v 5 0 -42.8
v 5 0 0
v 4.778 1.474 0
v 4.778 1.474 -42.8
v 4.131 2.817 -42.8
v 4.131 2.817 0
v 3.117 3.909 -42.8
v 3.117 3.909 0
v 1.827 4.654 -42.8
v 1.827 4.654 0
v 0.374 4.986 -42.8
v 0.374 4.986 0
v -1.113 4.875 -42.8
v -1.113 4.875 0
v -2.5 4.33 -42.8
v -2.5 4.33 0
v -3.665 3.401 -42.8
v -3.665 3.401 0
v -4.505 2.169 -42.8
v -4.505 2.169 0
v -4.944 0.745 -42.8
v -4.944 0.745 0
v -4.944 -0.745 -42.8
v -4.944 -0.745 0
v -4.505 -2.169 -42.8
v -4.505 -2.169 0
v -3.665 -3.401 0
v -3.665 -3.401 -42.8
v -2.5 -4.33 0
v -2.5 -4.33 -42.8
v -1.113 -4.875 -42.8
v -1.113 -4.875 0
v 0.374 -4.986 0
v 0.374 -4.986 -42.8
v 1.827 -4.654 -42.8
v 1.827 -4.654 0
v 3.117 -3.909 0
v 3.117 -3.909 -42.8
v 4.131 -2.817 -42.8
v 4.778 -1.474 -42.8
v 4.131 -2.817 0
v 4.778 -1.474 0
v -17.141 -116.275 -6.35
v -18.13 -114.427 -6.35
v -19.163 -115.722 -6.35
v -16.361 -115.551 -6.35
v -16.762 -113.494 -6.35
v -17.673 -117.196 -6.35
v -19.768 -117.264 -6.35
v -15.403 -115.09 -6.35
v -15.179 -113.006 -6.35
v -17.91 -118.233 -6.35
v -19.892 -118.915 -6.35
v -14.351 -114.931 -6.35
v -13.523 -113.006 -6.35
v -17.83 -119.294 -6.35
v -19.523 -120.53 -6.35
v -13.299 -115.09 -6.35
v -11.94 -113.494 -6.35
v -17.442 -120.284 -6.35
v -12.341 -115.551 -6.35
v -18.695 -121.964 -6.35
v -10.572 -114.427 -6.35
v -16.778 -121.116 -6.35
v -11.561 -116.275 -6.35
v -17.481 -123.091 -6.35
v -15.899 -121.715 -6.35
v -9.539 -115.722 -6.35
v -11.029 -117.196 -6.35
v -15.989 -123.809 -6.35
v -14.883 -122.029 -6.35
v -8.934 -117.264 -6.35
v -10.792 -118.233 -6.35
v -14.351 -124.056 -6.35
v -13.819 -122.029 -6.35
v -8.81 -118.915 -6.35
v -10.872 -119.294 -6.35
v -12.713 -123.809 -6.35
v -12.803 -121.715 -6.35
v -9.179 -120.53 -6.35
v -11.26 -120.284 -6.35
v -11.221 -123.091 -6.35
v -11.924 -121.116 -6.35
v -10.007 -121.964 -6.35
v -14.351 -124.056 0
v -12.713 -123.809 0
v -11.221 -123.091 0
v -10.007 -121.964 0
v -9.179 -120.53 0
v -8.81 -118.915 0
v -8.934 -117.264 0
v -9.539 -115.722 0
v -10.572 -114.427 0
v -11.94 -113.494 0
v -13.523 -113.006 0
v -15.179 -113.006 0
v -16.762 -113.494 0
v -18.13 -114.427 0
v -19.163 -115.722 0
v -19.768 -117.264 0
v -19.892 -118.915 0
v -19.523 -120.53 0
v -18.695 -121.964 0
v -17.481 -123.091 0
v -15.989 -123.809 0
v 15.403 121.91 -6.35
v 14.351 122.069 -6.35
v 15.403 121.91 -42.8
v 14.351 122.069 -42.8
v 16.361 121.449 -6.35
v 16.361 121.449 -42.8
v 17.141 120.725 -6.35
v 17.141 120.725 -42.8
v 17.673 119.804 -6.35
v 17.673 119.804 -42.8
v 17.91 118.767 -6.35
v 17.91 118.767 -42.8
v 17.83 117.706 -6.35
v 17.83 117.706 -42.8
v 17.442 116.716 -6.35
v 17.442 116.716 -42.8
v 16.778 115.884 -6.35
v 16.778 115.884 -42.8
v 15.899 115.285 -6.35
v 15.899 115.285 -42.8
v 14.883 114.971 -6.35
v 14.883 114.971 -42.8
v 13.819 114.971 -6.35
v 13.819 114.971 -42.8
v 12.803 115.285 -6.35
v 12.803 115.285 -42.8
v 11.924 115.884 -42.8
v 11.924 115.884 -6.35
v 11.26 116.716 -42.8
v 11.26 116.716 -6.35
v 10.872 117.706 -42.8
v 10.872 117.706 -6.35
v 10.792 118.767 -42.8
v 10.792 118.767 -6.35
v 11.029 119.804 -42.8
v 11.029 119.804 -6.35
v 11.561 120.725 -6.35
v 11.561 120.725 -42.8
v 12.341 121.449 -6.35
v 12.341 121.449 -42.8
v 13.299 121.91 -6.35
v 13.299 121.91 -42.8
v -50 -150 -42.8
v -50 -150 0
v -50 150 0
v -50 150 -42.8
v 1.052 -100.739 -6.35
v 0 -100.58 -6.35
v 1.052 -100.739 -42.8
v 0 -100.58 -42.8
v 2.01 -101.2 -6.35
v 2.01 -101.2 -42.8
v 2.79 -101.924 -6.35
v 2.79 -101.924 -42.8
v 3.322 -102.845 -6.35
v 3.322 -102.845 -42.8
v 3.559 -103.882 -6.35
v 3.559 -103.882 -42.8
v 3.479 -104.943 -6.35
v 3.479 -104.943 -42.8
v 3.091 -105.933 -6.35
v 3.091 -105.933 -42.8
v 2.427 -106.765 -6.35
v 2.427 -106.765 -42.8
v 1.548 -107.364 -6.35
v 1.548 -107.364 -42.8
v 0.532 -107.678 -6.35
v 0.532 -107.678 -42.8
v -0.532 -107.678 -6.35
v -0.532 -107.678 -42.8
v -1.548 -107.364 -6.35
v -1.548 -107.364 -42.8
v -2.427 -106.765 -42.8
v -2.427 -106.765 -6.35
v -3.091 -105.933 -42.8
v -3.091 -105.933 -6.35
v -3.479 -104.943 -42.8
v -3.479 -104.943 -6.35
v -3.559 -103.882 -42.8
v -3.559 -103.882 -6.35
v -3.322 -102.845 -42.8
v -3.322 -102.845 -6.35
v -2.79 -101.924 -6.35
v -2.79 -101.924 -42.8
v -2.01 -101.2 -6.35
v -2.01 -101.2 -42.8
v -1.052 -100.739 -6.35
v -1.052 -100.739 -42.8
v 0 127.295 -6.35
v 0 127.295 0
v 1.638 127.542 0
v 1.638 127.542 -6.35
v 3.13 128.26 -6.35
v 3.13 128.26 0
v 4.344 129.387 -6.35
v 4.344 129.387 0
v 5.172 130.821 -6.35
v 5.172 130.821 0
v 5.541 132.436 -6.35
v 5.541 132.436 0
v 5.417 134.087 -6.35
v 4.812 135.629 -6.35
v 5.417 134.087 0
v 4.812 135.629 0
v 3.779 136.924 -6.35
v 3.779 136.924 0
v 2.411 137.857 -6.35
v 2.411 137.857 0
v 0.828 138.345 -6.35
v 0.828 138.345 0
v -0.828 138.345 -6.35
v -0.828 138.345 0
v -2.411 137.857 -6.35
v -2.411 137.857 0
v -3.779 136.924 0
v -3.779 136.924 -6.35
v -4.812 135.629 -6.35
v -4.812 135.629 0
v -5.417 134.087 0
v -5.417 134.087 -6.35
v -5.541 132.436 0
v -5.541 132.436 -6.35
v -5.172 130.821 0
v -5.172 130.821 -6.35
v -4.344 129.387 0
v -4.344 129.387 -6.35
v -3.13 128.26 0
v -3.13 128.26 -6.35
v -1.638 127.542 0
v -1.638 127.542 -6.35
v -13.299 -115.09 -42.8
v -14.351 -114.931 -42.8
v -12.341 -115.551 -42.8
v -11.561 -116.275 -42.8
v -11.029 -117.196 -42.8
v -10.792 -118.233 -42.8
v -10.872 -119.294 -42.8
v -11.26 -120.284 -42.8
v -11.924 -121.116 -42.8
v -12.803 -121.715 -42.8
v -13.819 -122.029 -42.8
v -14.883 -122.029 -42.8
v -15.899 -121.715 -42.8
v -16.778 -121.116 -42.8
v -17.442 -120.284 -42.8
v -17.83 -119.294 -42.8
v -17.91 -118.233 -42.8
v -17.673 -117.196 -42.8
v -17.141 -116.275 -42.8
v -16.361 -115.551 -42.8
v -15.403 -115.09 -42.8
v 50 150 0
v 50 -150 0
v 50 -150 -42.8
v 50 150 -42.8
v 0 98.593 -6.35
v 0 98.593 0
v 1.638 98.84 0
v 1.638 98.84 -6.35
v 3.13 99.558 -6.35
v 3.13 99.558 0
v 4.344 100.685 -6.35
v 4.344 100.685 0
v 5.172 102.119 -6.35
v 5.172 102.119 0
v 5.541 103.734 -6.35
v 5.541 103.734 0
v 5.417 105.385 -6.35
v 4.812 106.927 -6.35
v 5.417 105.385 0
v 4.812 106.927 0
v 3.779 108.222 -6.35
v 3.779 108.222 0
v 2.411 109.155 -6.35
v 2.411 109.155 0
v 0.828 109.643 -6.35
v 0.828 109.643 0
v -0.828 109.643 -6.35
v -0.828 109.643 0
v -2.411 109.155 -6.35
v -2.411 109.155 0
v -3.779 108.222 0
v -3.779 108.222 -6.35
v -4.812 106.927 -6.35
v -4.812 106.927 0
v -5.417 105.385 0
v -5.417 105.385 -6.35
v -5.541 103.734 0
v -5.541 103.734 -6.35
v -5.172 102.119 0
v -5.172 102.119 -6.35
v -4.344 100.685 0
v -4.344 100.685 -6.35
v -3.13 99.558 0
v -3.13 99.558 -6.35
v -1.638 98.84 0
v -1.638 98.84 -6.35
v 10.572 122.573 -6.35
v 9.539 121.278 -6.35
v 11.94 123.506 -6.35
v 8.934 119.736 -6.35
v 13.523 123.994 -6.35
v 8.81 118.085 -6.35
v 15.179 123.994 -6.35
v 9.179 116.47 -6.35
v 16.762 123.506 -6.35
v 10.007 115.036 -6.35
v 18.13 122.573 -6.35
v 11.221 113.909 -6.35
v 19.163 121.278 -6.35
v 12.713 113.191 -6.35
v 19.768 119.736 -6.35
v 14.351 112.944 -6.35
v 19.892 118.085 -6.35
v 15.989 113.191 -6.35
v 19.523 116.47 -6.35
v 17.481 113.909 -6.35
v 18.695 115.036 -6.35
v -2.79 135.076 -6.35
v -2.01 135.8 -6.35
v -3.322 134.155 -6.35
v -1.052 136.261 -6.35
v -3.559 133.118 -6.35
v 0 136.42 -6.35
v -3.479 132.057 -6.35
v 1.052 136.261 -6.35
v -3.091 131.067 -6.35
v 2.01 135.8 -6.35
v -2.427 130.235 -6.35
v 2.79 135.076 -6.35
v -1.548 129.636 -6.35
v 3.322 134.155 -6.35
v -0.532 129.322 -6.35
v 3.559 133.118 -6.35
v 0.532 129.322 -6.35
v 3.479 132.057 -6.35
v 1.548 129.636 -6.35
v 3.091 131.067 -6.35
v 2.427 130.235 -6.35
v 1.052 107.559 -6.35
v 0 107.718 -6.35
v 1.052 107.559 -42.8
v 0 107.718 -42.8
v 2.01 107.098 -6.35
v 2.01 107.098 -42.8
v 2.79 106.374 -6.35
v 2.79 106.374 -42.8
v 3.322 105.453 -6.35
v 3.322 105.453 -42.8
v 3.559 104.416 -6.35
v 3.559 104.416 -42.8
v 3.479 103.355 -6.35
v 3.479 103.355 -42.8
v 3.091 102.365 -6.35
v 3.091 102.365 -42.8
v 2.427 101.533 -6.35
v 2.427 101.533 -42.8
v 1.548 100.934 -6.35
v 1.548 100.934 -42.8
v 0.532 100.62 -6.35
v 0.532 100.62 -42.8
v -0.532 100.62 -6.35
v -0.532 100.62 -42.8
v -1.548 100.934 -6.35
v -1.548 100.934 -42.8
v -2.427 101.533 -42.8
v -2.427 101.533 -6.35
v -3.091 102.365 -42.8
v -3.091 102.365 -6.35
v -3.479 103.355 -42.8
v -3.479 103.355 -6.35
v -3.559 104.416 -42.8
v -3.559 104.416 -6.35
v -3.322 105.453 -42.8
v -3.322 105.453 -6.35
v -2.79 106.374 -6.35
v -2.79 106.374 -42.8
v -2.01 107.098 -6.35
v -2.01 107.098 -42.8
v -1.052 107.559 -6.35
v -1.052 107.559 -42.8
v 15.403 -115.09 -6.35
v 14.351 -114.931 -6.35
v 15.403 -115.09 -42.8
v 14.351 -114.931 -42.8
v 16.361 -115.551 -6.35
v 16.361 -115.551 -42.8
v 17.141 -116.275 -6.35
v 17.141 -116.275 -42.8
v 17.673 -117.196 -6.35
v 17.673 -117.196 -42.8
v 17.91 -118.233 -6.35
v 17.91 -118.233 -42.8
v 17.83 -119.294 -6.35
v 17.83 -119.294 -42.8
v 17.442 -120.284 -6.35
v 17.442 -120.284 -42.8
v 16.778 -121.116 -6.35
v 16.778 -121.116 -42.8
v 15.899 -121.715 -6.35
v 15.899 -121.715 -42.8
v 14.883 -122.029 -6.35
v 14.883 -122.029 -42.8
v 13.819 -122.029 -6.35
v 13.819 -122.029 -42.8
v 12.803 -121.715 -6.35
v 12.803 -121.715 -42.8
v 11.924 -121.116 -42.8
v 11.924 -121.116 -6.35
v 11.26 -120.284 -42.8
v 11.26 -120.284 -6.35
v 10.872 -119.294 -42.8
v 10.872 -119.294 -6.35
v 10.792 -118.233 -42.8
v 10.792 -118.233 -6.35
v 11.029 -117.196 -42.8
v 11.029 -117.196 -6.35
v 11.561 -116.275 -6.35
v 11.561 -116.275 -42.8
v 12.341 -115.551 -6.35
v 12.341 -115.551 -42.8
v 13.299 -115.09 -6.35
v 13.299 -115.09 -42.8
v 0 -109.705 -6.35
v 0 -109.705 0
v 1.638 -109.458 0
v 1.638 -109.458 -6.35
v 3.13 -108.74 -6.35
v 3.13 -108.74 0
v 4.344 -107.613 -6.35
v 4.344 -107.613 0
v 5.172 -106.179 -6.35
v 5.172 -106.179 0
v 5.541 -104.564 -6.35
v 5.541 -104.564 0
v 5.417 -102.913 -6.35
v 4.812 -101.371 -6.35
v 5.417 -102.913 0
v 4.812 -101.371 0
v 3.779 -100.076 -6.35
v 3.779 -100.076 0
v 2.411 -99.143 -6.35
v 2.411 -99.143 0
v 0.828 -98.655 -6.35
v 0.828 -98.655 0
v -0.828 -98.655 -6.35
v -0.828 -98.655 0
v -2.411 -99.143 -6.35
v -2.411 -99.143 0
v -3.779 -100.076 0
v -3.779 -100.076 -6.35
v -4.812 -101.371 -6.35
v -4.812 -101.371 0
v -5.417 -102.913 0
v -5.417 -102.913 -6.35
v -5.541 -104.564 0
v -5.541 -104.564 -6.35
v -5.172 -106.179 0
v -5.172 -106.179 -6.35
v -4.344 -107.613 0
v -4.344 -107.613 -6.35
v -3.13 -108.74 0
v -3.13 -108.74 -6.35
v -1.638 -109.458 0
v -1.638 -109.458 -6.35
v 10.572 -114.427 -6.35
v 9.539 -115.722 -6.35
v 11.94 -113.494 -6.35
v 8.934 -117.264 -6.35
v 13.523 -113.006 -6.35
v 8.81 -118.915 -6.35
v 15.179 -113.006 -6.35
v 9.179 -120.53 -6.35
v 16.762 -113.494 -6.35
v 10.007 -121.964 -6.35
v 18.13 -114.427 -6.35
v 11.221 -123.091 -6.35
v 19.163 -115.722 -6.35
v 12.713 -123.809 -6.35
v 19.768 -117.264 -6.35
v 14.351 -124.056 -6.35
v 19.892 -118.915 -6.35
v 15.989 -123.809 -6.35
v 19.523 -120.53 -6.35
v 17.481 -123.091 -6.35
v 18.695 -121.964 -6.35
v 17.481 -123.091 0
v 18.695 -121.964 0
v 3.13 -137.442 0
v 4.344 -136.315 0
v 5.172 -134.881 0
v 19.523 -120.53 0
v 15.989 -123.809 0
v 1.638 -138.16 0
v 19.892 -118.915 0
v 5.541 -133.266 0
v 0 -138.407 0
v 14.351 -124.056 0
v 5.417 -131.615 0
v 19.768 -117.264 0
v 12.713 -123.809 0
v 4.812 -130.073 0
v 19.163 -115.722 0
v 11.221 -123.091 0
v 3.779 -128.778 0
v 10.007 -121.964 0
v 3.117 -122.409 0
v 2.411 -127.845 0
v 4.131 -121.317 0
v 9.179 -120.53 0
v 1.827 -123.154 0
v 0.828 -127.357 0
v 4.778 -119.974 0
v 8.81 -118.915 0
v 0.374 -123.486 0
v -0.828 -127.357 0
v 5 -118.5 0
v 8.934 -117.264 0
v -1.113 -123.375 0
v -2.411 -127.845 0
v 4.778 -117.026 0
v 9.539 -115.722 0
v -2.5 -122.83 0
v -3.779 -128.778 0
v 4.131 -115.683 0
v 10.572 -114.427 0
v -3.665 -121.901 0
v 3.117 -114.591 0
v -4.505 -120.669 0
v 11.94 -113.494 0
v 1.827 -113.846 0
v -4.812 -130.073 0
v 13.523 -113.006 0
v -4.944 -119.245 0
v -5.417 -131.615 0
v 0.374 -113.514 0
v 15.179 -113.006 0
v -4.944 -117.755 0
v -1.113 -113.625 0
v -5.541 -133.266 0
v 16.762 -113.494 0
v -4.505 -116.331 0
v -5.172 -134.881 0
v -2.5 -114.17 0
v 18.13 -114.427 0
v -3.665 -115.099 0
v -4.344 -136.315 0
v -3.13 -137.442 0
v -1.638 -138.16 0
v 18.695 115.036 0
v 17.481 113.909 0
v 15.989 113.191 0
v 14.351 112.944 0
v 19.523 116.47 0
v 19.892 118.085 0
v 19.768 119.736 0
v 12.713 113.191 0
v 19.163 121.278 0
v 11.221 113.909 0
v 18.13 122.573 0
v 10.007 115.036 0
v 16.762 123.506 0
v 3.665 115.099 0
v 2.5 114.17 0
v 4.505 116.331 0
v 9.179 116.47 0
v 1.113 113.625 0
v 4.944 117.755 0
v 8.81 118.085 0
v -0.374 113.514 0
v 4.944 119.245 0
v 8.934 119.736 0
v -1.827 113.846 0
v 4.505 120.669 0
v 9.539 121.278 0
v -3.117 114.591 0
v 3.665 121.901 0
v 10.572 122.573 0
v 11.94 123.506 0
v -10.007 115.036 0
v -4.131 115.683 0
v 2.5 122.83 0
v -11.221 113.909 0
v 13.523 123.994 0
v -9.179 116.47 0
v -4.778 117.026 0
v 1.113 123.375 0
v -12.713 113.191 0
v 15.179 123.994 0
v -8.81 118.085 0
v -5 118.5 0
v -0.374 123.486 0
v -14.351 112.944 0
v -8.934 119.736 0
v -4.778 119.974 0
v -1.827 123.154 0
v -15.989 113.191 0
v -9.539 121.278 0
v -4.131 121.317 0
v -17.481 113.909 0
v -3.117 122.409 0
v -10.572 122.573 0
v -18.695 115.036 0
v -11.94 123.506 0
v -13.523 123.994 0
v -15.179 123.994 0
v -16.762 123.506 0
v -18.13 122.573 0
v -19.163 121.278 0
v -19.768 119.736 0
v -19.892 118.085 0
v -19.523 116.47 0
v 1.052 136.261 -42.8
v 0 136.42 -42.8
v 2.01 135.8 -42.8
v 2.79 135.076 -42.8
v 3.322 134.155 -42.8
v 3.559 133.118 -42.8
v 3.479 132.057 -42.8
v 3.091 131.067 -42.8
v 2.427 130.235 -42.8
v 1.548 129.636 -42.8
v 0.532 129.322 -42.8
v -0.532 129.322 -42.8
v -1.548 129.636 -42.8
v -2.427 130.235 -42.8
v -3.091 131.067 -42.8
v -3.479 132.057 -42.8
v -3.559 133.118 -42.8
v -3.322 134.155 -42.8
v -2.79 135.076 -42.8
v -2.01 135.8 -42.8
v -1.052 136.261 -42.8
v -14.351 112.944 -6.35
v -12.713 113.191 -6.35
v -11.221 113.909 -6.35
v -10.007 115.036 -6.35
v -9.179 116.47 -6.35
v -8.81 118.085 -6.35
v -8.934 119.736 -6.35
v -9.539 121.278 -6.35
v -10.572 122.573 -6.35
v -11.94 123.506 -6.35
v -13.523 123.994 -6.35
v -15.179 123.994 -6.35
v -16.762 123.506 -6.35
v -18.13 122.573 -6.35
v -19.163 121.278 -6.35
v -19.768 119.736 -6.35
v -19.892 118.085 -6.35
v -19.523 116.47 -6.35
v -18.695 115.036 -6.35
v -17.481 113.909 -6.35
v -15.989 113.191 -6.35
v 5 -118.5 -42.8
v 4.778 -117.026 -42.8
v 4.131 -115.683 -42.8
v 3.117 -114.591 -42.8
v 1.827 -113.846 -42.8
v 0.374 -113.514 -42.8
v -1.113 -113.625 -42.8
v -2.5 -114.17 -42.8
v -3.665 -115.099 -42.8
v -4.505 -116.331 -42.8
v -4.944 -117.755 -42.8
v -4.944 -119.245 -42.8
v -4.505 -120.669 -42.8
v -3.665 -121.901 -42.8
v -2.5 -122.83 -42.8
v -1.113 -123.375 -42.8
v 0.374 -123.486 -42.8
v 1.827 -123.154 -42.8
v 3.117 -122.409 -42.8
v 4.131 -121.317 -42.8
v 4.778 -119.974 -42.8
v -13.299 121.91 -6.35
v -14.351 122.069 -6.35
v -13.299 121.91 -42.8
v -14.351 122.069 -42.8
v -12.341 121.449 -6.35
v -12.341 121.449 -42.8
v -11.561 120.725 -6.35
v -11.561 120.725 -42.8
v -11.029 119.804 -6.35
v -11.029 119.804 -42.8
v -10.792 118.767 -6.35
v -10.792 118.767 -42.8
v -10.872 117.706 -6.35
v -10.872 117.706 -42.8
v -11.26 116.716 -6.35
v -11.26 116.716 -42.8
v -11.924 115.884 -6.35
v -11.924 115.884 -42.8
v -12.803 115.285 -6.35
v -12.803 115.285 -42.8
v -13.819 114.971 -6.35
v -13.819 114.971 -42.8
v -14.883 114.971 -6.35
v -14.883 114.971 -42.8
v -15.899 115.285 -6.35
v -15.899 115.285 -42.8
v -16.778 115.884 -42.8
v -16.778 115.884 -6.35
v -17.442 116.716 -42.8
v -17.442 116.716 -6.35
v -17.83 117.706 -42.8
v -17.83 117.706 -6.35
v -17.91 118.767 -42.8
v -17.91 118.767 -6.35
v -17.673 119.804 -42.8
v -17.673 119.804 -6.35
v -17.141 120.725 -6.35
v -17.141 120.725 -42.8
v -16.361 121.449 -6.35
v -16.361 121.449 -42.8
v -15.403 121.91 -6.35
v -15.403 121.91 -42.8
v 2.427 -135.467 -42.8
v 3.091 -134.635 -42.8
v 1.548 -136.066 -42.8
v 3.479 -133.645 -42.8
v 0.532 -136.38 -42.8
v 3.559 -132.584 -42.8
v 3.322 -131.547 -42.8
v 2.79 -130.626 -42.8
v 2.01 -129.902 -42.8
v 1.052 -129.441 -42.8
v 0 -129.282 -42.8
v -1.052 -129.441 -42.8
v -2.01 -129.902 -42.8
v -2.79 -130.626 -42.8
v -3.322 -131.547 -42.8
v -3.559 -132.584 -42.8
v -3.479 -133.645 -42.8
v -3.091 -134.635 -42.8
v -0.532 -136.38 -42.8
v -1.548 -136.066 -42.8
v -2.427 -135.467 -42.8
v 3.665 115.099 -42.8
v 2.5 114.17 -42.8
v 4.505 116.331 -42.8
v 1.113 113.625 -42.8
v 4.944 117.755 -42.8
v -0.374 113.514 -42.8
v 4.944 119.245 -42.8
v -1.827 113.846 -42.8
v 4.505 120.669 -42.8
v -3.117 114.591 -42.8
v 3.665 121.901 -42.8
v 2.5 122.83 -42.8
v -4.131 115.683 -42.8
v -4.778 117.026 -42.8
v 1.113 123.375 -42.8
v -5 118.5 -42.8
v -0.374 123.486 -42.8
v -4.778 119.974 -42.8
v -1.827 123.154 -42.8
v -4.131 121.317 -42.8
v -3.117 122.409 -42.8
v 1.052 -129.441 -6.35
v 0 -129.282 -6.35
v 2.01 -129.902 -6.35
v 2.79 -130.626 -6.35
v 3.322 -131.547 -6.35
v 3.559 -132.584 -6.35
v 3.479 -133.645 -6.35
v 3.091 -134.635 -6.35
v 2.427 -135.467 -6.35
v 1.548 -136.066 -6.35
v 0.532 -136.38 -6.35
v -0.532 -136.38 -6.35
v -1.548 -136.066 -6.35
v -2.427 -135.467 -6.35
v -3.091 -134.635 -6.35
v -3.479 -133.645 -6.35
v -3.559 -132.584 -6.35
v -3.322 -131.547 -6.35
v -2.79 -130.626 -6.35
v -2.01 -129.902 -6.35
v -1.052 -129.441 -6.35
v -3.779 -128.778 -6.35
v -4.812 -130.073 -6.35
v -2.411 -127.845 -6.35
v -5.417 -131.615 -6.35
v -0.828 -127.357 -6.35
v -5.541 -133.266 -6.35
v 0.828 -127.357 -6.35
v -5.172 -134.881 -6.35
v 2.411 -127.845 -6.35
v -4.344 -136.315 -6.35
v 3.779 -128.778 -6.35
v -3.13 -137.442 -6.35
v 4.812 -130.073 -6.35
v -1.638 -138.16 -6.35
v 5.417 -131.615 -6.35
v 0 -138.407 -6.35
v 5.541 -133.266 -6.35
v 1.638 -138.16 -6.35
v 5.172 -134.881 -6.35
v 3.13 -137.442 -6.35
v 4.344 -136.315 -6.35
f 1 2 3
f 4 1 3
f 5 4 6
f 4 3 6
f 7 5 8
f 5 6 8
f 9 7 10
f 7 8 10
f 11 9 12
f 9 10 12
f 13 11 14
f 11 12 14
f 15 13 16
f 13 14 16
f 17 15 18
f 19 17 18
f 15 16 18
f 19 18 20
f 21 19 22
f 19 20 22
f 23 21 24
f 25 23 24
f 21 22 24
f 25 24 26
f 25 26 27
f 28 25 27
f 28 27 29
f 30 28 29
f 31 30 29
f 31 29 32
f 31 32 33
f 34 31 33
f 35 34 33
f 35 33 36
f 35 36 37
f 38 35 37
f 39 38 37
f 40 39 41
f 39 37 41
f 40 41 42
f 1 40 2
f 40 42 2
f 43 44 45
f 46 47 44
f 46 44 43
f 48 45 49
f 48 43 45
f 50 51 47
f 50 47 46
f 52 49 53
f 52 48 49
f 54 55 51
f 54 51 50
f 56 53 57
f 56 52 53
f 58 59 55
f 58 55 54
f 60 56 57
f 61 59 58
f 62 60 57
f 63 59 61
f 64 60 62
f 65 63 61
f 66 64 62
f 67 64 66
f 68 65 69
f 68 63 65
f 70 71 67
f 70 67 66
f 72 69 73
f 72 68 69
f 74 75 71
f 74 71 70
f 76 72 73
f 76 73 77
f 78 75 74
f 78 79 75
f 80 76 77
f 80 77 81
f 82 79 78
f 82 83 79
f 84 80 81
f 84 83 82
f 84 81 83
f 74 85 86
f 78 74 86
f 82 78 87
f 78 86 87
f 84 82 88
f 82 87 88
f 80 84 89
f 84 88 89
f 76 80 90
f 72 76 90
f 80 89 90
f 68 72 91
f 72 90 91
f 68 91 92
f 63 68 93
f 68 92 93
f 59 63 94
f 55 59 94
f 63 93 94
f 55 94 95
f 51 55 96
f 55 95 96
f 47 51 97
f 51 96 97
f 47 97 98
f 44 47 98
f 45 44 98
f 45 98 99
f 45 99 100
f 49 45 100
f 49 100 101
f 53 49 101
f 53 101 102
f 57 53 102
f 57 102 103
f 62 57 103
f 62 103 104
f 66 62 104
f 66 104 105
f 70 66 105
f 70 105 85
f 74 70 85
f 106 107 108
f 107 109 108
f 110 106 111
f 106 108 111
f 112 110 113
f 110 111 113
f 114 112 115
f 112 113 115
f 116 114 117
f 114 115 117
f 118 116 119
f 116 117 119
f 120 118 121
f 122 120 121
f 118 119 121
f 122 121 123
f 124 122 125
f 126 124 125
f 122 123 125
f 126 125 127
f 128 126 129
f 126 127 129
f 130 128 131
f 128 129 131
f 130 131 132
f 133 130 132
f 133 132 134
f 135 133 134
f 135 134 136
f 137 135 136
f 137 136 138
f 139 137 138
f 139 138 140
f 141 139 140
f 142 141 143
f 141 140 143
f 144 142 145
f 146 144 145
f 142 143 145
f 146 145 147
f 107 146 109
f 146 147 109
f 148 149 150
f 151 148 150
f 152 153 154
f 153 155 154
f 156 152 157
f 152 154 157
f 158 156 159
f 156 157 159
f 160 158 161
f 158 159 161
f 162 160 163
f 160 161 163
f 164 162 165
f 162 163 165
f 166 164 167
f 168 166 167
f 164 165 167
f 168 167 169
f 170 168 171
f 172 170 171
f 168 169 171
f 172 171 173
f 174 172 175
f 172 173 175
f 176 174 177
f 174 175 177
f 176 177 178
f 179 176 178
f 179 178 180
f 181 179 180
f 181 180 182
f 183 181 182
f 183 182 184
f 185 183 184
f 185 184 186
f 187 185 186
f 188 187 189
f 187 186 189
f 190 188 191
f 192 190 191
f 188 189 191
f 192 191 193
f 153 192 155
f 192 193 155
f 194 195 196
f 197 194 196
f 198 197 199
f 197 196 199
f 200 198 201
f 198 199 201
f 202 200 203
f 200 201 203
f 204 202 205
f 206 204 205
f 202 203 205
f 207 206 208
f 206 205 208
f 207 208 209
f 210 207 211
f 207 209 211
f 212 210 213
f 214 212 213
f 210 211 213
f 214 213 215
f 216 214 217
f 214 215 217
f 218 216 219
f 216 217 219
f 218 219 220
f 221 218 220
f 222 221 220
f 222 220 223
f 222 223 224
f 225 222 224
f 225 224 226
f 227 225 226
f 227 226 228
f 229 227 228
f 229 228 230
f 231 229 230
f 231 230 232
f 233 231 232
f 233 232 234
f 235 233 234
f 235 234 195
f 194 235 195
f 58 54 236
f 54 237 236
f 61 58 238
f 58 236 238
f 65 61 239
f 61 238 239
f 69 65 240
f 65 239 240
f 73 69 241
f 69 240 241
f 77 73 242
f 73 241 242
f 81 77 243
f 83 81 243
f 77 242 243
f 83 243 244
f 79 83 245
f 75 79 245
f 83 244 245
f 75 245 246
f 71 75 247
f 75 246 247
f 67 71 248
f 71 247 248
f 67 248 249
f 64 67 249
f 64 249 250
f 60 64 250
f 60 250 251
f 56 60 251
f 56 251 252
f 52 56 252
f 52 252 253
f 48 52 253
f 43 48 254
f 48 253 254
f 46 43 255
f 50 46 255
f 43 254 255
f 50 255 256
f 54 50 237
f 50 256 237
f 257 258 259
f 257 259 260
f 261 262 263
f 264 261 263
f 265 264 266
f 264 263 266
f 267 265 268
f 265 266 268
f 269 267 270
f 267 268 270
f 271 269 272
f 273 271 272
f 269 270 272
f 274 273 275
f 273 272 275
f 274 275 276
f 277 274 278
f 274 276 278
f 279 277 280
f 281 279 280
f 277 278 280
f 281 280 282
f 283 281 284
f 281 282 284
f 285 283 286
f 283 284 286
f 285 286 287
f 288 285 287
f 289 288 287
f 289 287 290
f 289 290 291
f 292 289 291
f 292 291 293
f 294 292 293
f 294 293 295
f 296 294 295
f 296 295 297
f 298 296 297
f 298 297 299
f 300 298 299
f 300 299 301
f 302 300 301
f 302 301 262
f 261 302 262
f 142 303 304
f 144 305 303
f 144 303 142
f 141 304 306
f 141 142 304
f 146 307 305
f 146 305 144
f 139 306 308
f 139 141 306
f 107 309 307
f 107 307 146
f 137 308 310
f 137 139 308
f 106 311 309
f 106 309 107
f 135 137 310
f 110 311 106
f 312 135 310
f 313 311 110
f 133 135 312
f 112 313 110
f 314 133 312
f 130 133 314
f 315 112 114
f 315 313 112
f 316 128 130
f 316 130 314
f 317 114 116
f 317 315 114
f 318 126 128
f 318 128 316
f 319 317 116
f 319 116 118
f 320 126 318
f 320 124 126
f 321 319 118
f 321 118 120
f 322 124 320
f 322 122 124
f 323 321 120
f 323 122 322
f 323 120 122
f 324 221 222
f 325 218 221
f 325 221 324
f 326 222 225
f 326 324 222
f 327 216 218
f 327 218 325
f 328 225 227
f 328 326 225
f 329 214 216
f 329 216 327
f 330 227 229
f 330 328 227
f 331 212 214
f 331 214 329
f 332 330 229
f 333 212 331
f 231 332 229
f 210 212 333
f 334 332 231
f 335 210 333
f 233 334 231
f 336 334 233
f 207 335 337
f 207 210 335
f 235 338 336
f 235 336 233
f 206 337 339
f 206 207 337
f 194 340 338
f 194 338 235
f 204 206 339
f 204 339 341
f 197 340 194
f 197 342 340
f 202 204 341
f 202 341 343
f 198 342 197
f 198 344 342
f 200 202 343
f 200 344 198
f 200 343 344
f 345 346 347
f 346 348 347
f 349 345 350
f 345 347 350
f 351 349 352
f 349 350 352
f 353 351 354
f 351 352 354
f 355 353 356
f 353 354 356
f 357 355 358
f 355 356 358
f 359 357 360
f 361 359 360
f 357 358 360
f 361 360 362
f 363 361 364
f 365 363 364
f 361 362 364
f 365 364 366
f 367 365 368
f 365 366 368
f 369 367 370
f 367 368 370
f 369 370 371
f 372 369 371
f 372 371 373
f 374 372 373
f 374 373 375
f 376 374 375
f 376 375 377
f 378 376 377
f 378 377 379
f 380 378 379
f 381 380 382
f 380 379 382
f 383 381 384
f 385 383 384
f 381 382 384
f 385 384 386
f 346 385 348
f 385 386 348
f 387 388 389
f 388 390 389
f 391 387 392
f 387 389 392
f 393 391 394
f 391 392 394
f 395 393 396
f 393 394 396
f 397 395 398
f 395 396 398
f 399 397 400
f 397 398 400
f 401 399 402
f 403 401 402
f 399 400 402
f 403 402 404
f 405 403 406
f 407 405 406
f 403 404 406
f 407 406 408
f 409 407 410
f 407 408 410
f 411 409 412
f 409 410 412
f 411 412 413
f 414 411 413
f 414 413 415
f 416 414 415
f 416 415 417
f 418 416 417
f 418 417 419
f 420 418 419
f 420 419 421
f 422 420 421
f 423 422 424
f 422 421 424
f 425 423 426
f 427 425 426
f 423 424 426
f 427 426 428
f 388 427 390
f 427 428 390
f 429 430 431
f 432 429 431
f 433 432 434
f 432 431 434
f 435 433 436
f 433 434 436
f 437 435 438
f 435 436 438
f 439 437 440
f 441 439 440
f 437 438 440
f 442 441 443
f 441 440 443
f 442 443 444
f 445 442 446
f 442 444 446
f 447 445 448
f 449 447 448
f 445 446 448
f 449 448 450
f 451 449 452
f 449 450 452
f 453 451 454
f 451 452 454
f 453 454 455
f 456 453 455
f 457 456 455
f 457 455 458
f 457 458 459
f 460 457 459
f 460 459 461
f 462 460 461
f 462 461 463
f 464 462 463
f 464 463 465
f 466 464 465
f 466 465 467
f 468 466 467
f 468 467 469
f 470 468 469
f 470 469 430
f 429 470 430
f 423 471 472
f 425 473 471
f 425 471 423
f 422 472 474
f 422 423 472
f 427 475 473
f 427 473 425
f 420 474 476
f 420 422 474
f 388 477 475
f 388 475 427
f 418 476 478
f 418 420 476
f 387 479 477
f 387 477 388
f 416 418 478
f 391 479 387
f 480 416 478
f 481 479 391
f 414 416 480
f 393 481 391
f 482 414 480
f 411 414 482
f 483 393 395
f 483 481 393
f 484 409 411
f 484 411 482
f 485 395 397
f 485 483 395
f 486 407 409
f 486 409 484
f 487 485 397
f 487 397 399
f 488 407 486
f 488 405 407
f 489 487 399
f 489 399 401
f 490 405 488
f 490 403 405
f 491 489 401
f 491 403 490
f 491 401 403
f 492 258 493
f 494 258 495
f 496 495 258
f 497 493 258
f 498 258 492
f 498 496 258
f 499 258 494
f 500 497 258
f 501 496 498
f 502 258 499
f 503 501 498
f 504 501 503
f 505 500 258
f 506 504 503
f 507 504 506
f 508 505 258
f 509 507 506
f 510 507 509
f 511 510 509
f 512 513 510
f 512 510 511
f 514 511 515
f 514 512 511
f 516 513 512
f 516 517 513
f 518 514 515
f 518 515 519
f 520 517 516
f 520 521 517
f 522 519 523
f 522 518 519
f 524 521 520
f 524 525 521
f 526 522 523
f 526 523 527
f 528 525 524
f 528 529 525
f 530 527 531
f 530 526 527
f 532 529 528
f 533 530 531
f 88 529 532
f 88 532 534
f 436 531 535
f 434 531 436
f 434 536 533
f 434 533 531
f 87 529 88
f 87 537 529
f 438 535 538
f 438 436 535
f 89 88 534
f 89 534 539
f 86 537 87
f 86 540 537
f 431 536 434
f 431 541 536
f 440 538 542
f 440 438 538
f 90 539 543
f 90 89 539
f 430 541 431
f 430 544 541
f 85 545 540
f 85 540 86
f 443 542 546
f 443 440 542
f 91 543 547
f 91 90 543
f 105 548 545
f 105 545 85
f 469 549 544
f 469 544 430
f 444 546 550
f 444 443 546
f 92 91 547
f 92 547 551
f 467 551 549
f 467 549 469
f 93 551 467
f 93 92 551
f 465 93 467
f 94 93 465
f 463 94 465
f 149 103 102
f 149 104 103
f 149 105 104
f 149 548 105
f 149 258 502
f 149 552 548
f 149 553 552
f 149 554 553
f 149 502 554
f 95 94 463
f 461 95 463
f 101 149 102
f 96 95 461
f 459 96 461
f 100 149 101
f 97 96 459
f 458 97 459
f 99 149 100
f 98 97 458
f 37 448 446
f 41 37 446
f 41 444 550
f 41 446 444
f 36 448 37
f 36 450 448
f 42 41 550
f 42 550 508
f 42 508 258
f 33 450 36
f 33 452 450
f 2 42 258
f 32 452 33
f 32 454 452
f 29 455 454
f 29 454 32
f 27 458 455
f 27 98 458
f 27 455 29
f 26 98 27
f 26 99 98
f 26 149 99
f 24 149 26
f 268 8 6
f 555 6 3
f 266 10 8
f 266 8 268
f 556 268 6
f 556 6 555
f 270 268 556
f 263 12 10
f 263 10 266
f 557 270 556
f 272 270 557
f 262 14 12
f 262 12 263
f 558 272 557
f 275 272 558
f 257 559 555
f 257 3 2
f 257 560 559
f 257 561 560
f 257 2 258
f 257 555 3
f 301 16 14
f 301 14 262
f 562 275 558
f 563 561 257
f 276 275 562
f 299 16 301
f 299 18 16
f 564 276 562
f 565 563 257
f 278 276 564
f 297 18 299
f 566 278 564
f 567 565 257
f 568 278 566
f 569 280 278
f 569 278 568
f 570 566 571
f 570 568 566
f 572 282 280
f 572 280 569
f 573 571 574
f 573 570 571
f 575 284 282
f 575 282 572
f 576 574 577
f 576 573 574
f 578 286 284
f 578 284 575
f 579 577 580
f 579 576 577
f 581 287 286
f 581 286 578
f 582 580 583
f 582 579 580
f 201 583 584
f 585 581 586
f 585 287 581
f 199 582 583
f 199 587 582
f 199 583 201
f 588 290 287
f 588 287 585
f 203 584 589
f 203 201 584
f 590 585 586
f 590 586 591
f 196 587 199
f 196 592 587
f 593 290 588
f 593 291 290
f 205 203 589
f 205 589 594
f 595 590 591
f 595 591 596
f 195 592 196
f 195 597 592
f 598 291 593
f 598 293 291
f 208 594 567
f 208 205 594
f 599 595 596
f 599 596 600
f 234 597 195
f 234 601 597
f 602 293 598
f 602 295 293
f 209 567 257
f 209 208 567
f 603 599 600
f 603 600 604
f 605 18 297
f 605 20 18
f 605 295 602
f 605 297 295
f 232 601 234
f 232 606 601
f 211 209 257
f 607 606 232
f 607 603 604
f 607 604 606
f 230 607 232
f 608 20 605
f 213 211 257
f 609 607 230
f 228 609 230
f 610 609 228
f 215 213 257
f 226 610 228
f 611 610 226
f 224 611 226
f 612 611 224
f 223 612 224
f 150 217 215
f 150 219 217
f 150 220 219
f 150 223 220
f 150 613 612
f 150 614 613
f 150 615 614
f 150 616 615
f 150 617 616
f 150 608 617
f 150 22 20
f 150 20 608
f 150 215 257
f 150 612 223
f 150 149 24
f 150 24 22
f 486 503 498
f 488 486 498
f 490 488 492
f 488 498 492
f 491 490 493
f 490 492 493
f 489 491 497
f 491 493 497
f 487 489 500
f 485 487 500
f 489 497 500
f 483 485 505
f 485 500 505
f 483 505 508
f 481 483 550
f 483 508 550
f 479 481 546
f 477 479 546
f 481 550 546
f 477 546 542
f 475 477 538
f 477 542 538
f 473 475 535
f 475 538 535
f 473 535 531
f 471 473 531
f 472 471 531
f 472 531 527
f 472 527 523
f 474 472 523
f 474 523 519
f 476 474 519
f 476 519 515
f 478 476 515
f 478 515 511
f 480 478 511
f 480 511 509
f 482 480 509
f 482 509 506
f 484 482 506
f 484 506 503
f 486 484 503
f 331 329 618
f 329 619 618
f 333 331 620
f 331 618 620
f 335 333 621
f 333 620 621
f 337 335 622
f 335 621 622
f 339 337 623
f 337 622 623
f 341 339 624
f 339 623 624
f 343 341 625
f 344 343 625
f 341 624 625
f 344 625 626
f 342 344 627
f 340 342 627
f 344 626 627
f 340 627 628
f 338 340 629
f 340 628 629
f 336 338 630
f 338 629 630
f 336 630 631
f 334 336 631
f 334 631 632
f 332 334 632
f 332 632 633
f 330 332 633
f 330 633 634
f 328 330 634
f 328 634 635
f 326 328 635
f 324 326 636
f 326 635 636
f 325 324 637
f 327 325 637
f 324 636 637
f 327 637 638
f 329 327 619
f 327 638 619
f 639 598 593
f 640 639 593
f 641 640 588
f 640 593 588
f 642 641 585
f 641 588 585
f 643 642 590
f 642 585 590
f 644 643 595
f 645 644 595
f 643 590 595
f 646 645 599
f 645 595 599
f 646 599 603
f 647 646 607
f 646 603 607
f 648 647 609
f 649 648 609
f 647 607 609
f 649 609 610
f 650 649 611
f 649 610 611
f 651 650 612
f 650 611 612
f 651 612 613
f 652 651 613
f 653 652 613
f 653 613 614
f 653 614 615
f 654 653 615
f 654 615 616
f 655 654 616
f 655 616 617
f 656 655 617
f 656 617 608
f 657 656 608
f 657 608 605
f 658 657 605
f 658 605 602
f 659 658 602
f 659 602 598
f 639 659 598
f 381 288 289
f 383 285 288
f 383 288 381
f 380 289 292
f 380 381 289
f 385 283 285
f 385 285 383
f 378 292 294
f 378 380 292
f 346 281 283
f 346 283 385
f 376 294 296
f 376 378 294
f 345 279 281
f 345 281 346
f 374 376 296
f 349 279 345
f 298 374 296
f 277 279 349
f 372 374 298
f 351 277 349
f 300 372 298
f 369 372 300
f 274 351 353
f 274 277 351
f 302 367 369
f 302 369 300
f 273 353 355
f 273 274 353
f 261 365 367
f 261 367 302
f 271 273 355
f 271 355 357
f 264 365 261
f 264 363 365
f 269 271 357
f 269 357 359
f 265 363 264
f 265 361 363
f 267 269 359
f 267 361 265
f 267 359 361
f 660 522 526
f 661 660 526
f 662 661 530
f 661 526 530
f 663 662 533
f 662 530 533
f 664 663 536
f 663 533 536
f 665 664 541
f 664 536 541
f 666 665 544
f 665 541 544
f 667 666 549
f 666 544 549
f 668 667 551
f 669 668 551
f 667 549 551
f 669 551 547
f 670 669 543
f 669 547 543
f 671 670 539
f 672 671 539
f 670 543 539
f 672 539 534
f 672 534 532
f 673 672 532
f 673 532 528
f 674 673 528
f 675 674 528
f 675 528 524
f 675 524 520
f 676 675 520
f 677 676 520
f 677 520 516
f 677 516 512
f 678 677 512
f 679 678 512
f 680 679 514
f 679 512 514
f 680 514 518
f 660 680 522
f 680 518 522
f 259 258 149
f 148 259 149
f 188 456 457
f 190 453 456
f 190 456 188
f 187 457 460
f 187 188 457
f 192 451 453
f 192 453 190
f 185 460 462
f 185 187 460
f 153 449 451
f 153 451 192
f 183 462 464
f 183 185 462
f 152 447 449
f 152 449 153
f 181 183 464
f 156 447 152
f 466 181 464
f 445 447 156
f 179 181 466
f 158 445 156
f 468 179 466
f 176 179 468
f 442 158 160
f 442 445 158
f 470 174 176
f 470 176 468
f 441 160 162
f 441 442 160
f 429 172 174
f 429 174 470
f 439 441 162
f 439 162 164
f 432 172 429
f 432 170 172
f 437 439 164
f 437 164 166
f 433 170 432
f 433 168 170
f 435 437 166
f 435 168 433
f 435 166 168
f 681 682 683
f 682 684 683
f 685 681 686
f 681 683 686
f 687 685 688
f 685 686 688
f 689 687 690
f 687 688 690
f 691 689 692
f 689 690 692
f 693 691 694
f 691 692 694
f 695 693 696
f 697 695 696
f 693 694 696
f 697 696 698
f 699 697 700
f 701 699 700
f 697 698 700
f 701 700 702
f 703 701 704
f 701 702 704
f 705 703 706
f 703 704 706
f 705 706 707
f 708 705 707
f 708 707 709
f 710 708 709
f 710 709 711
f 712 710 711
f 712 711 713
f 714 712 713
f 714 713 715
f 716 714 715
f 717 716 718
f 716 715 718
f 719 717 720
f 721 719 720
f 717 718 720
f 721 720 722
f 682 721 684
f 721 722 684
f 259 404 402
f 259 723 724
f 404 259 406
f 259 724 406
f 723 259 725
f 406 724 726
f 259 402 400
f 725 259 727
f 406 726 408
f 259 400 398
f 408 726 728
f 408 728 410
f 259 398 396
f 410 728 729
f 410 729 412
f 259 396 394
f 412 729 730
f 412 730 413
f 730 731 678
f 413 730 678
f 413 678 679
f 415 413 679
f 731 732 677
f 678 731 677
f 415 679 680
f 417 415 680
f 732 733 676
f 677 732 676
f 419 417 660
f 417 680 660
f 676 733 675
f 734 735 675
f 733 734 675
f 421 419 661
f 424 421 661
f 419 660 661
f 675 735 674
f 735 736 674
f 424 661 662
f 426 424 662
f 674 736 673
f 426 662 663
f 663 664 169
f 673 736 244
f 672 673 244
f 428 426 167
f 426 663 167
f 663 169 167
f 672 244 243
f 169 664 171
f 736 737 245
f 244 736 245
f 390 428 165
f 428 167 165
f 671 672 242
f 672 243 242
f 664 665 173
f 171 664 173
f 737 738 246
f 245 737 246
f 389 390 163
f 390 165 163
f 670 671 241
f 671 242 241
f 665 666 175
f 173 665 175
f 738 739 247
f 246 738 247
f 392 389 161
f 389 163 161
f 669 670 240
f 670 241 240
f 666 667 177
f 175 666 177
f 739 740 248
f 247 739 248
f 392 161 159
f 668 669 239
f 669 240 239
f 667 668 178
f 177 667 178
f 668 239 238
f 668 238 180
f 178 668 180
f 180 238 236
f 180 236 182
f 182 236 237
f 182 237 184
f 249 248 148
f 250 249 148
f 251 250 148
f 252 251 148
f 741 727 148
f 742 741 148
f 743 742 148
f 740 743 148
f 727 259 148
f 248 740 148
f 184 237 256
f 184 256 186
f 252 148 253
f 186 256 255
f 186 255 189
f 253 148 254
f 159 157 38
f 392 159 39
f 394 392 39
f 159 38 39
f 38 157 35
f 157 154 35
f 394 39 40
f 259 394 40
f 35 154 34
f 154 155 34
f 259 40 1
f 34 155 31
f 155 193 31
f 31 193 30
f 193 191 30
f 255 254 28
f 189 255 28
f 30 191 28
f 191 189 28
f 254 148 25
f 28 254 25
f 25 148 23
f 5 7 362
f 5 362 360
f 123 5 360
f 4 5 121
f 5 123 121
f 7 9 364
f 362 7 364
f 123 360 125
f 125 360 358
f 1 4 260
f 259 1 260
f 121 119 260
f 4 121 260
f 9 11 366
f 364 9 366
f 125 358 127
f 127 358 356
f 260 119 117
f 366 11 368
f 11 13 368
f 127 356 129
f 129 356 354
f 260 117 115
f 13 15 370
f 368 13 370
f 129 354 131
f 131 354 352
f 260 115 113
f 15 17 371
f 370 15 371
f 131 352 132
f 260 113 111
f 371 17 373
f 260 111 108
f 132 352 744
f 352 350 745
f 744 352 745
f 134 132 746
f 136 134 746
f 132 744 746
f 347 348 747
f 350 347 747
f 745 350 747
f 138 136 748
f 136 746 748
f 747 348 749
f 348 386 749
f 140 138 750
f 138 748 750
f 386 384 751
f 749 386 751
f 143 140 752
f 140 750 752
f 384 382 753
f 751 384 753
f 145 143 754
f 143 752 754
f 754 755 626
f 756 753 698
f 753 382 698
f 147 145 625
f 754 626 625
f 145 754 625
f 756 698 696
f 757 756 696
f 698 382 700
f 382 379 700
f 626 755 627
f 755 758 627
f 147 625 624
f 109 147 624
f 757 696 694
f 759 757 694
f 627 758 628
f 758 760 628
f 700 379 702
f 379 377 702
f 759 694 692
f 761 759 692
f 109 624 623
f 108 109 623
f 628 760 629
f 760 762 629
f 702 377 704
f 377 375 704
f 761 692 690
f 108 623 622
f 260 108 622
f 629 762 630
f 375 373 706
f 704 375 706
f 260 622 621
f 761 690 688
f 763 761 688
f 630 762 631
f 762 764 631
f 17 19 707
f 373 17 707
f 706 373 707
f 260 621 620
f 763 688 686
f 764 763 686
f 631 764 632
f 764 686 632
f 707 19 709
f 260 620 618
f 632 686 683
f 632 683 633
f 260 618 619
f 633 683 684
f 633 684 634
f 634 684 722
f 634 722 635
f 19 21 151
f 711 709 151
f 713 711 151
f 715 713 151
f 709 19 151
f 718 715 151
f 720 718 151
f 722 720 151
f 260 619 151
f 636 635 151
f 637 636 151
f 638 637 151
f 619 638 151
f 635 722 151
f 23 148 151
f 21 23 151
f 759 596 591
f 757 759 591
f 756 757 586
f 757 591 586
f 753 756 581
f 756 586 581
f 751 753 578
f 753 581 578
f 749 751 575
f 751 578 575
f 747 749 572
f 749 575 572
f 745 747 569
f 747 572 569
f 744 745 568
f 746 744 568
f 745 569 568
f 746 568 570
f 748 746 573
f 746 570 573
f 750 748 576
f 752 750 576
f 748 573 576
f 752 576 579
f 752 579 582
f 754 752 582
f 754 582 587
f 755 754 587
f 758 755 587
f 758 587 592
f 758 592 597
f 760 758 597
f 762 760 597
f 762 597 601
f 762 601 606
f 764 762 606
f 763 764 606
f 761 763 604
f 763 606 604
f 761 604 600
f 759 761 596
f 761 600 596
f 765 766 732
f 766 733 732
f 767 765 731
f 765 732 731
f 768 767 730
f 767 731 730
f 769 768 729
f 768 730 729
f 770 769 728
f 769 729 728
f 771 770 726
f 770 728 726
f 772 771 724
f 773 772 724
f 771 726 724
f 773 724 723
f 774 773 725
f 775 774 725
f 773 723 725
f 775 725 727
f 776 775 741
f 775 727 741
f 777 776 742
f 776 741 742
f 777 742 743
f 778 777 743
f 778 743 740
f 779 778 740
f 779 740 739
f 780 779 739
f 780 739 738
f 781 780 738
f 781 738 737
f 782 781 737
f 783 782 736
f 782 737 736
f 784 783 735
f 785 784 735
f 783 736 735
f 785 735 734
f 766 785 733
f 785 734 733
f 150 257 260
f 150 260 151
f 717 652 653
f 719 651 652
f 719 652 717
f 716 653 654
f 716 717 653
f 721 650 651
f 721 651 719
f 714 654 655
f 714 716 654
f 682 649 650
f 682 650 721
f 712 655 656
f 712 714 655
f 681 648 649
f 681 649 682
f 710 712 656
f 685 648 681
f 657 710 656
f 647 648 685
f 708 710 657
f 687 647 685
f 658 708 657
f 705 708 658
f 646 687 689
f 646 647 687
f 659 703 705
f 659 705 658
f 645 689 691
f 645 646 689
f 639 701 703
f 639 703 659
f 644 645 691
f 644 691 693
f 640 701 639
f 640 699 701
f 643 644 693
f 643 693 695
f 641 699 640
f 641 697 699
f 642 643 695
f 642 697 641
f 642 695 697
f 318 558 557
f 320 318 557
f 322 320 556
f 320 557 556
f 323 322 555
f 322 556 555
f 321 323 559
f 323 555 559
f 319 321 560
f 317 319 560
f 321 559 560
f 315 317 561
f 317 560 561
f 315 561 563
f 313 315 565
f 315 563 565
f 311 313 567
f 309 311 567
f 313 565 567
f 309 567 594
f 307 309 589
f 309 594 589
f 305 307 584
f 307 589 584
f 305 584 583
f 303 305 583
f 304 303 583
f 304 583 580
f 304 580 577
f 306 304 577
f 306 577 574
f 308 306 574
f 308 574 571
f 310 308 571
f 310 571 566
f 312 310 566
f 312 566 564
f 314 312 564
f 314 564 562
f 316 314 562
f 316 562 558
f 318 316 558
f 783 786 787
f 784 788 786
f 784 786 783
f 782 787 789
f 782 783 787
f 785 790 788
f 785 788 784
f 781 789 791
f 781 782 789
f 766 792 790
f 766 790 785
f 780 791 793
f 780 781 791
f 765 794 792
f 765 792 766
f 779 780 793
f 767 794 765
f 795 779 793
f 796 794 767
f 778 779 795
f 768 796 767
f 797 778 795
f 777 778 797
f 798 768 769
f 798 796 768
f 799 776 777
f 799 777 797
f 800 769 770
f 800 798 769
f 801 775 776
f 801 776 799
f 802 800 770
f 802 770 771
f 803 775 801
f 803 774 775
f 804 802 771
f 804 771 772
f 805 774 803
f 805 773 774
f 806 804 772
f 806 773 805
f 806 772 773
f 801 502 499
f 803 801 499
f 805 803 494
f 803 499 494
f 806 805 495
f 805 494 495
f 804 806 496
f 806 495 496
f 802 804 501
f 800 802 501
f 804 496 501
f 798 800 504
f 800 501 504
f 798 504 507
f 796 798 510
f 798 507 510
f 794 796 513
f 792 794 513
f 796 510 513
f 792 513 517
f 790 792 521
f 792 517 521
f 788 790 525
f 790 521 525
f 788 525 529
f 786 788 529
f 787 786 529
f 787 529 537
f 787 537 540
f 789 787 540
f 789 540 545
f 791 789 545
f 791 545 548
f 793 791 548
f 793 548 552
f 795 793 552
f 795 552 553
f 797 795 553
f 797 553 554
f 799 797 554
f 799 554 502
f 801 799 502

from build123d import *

# Parameters (mm, degrees)
SKETCH1_W                                        = 300
SKETCH1_H                                        = 100
SKETCH1_R                                        = 5
BOSS_EXTRUDE1_DEPTH                              = 42.8
CBORE_FOR_1_4_SOCKET_HEAD_CAP_SCREW1_D           = 7.1374
CBORE_FOR_1_4_SOCKET_HEAD_CAP_SCREW1_CBORE_D     = 11.1125
CBORE_FOR_1_4_SOCKET_HEAD_CAP_SCREW1_CBORE_DEPTH = 6.35


with BuildPart() as part:
    # Sketch1 → Boss-Extrude1 (new body)
    with BuildSketch(Plane(origin=(0, 0, 0), x_dir=(0, 1, 0), z_dir=(0, 0, 1))):
        Rectangle(SKETCH1_W, SKETCH1_H)
        with Locations(Location((0, 0, 0), (0, 0, 270))):
            Circle(SKETCH1_R, mode=Mode.SUBTRACT)
        with Locations(Location((-118.5, 0, 0), (0, 0, 270))):
            Circle(SKETCH1_R, mode=Mode.SUBTRACT)
        with Locations(Location((118.5, 0, 0), (0, 0, 90))):
            Circle(SKETCH1_R, mode=Mode.SUBTRACT)
    extrude(amount=-BOSS_EXTRUDE1_DEPTH)

    # CBORE for 1/4 Socket Head Cap Screw1 (through all)
    with Locations(Plane(origin=(0, 0, 0), x_dir=(0, -1, 0), z_dir=(0, 0, 1))):
        with Locations((118.5, 14.351), (132.851, 0), (118.5, -14.351), (104.149, 0), (-104.149, 0), (-118.5, 14.351), (-132.851, 0), (-118.5, -14.351)):
            CounterBoreHole(CBORE_FOR_1_4_SOCKET_HEAD_CAP_SCREW1_D / 2, CBORE_FOR_1_4_SOCKET_HEAD_CAP_SCREW1_CBORE_D / 2, CBORE_FOR_1_4_SOCKET_HEAD_CAP_SCREW1_CBORE_DEPTH)


solid = part.part
